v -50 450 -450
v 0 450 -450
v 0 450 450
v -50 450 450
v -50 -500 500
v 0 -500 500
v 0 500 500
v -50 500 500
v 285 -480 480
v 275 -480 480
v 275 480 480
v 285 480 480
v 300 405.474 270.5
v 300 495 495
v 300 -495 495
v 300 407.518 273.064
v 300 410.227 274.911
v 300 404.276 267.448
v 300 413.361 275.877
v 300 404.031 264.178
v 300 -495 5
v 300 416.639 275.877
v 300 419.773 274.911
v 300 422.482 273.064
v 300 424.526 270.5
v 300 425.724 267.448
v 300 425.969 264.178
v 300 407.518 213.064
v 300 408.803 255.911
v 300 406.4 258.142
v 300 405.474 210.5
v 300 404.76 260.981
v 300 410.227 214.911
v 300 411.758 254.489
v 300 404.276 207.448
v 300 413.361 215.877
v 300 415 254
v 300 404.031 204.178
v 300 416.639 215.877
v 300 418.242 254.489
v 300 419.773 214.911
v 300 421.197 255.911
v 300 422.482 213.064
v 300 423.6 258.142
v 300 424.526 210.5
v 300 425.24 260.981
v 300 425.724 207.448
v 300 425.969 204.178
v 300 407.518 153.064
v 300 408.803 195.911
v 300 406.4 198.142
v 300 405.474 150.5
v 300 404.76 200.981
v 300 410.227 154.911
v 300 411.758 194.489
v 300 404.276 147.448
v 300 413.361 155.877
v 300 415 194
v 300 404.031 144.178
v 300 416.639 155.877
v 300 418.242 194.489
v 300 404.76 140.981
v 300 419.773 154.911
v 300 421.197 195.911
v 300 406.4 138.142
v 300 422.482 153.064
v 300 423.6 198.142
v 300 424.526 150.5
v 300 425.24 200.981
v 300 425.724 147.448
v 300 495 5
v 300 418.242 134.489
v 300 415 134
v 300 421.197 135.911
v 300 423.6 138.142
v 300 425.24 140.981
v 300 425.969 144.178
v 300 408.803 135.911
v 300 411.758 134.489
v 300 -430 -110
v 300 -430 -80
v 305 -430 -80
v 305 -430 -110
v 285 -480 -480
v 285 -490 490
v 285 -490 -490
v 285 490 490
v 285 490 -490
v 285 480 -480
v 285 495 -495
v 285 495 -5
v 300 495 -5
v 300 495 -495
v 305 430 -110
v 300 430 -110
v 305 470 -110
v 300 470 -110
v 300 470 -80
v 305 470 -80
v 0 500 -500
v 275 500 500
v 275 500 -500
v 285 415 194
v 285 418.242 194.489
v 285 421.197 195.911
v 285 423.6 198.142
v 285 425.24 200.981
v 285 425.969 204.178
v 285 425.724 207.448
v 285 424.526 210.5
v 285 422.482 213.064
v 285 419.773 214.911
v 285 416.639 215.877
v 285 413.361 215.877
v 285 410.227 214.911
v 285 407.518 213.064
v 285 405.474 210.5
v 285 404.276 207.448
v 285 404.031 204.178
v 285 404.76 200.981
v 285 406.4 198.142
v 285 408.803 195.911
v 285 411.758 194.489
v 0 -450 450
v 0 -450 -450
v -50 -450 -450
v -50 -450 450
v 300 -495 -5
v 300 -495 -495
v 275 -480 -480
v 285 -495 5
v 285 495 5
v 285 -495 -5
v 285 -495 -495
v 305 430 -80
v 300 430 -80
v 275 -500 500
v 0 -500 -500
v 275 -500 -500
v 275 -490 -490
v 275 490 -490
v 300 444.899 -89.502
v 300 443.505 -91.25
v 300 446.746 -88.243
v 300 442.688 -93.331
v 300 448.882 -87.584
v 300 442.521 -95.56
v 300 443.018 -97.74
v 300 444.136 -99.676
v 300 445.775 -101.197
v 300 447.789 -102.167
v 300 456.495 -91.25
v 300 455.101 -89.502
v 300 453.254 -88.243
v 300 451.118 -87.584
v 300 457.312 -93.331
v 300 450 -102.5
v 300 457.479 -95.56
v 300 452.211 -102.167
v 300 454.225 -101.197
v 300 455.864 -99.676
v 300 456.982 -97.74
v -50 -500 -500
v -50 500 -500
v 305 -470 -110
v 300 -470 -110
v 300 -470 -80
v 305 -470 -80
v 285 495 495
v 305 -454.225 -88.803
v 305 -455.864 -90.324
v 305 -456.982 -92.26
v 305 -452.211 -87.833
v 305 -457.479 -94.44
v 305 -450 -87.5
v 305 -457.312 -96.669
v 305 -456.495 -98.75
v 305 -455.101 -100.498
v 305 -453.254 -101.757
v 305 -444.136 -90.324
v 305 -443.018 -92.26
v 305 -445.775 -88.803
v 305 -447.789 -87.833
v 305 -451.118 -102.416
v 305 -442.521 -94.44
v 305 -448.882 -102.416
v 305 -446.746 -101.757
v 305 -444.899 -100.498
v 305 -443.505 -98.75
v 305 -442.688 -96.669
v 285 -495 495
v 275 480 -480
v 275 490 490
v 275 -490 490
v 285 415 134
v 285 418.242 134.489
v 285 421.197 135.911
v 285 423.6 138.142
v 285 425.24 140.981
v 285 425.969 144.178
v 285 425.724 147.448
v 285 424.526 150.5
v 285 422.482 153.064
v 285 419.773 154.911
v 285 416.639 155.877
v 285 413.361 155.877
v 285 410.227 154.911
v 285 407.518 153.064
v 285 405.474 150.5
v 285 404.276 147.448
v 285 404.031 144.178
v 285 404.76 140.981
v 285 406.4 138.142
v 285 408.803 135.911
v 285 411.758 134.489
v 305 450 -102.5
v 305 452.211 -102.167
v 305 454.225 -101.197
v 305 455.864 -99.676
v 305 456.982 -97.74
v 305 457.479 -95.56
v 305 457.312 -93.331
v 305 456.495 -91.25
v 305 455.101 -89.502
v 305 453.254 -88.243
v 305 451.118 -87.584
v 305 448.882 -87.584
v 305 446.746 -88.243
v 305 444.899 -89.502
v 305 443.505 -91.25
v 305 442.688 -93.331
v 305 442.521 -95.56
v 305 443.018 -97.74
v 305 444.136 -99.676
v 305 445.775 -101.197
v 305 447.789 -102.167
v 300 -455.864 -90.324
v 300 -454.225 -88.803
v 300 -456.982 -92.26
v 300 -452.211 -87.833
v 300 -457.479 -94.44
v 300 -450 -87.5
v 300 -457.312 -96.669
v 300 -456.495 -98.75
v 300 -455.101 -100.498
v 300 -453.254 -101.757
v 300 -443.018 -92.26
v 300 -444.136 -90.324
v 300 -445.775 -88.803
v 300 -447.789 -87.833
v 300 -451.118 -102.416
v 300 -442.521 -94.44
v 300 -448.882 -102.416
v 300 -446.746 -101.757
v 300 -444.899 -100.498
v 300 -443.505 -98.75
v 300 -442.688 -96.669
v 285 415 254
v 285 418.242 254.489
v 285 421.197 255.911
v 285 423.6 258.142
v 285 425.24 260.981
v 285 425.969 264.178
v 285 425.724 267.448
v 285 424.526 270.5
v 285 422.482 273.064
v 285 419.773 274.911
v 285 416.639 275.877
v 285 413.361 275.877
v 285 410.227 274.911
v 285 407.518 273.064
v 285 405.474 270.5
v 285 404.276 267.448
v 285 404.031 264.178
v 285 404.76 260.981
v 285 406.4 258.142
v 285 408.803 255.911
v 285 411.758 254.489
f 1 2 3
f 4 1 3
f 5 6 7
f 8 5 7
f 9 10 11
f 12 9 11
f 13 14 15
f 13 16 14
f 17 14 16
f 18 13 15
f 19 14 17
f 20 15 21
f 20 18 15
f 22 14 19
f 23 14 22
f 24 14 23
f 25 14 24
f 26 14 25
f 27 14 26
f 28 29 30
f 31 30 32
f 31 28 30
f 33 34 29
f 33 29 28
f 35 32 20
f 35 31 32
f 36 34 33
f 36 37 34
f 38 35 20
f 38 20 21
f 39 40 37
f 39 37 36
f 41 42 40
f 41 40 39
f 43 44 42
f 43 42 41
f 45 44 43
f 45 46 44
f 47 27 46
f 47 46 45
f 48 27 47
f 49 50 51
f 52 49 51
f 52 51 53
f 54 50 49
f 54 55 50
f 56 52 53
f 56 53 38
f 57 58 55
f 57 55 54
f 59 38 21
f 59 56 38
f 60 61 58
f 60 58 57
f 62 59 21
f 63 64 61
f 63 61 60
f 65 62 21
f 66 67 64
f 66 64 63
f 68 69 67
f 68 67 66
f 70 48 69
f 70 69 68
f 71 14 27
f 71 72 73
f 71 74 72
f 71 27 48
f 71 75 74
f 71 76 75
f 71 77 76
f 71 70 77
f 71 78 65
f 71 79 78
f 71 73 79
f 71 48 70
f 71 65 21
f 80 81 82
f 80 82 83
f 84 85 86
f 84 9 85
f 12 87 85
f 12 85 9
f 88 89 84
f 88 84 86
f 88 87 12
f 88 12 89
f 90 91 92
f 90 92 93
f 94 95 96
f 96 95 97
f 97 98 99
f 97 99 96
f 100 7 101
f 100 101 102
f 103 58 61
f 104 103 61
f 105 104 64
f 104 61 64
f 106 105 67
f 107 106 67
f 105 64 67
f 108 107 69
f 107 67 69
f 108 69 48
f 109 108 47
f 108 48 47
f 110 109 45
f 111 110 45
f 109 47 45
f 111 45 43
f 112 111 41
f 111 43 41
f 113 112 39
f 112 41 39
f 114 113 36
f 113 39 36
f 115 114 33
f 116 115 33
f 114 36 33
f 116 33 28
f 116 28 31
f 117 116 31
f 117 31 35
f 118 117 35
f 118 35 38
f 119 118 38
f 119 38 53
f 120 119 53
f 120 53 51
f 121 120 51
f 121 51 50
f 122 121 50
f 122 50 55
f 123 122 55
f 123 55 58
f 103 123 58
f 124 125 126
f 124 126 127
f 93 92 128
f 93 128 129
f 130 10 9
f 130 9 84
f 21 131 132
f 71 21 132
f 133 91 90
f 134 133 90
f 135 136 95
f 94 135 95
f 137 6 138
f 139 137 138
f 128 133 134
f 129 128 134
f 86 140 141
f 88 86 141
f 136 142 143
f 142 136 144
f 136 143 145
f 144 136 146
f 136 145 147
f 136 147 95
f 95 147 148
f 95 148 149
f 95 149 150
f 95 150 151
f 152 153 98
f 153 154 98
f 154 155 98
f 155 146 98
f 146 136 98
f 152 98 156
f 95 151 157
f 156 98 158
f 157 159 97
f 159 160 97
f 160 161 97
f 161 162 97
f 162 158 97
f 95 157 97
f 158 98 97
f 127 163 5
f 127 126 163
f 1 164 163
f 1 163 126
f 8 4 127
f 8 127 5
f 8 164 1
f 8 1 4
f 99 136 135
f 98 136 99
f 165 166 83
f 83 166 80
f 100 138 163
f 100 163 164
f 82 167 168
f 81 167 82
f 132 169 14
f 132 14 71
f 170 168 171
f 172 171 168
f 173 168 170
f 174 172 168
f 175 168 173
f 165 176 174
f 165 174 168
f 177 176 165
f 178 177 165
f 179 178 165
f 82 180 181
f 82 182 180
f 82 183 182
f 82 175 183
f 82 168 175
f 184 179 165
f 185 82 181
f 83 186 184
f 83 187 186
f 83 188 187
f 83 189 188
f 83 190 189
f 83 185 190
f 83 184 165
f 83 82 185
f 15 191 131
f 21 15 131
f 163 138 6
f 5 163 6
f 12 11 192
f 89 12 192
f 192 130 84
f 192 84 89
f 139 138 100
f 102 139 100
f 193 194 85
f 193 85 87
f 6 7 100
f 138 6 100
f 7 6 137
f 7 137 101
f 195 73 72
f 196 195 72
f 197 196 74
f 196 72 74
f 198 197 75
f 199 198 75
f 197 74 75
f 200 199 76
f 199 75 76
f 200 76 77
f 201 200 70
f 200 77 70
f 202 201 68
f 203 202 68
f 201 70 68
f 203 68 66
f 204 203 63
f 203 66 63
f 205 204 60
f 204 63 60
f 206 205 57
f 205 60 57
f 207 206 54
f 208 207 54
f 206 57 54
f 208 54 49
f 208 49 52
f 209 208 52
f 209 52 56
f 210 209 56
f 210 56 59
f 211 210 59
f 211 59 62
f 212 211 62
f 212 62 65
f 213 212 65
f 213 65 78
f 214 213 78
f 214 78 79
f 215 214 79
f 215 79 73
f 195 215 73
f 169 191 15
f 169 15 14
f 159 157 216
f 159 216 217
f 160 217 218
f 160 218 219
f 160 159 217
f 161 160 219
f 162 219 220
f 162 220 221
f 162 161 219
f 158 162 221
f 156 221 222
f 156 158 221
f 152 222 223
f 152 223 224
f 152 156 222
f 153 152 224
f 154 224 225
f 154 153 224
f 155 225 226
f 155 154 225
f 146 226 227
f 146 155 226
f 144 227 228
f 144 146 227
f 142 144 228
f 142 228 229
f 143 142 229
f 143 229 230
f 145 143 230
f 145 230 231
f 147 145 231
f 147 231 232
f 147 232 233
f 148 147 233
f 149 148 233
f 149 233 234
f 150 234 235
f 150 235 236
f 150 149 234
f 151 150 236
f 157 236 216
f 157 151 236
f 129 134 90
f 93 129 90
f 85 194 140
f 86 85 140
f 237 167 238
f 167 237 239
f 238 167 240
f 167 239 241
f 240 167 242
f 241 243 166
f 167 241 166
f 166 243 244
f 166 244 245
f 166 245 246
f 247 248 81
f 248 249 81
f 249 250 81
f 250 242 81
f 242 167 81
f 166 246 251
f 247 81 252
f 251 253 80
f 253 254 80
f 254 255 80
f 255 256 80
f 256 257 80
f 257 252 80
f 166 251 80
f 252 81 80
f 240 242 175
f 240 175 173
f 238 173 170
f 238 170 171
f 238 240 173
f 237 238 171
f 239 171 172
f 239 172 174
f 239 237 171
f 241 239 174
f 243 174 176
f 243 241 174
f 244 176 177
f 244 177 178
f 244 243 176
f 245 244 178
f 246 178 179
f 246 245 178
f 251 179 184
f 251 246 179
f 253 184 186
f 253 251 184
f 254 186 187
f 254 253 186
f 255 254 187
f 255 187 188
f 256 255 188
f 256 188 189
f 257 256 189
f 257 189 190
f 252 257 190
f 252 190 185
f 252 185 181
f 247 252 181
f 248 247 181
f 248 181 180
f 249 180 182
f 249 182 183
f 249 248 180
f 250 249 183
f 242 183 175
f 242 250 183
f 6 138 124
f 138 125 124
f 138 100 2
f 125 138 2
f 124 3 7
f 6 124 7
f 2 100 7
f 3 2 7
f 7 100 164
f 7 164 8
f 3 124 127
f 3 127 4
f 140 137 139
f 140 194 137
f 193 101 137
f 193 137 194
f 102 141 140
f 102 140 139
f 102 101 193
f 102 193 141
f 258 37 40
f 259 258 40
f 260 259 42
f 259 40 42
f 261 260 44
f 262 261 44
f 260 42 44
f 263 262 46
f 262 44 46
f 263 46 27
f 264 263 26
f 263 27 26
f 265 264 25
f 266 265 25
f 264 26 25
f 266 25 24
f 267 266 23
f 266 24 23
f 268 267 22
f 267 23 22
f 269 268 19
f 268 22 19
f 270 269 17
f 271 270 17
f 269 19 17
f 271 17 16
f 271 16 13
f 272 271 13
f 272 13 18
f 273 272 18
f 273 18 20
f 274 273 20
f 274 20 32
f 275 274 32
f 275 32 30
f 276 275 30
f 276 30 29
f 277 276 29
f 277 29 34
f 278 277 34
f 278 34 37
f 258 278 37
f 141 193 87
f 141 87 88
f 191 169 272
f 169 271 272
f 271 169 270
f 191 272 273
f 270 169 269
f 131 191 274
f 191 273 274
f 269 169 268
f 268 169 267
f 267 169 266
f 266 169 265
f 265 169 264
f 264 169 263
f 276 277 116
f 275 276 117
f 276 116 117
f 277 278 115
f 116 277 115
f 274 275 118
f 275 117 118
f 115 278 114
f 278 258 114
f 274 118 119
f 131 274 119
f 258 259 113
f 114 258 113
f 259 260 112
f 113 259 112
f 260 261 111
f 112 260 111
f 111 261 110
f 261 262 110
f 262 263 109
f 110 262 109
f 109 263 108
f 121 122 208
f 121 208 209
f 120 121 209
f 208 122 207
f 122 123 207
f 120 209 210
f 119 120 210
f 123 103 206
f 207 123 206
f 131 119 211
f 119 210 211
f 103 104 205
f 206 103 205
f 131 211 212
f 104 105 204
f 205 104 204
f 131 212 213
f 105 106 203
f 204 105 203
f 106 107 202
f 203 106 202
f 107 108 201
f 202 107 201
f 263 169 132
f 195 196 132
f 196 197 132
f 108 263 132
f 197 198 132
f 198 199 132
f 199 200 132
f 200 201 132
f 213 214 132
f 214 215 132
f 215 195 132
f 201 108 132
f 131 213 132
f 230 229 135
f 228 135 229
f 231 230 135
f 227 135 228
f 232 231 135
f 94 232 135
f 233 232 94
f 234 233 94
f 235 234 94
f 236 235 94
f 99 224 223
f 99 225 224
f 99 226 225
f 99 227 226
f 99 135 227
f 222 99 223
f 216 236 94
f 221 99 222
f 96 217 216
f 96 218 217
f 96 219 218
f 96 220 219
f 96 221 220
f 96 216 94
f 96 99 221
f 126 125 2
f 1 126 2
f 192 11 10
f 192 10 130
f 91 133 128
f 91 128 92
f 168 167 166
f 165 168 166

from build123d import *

# Parameters (mm, degrees)
SKETCH1_W             = 1000
SKETCH1_H             = 1000
BOSS_EXTRUDE1_DEPTH   = 275
BOSS_EXTRUDE2_START   = 10
SKETCH2_W             = 490
SKETCH2_H             = 990
BOSS_EXTRUDE2_DEPTH   = 15
BOSS_EXTRUDE2_2_DEPTH = 15
SKETCH3_W             = 980
SKETCH3_H             = 980
SKETCH3_W_2           = 960
SKETCH3_H_2           = 960
BOSS_EXTRUDE3_DEPTH   = 10
SKETCH4_W             = 1000
SKETCH4_H             = 1000
SKETCH4_W_2           = 900
SKETCH4_H_2           = 900
BOSS_EXTRUDE4_DEPTH   = 50
SKETCH5_R             = 11
CUT_EXTRUDE1_DEPTH    = 25
SKETCH6_W             = 30
SKETCH6_H             = 40
SKETCH6_R             = 7.5
BOSS_EXTRUDE5_DEPTH   = 5
BOSS_EXTRUDE5_2_DEPTH = 5


with BuildPart() as part:
    # Sketch1 → Boss-Extrude1 (new body)
    with BuildSketch(Plane(origin=(0, 0, 0), x_dir=(0, 0, -1), z_dir=(1, 0, 0))):
        Rectangle(SKETCH1_W, SKETCH1_H)
    extrude(amount=BOSS_EXTRUDE1_DEPTH)

    # Sketch3 → Boss-Extrude3 (add)
    with BuildSketch(Plane(origin=(275, 0, 0), x_dir=(0, 0, -1), z_dir=(1, 0, 0))):
        Rectangle(SKETCH3_W, SKETCH3_H)
        Rectangle(SKETCH3_W_2, SKETCH3_H_2, mode=Mode.SUBTRACT)
    extrude(amount=BOSS_EXTRUDE3_DEPTH)


with BuildPart() as body_2:
    # Sketch2 → Boss-Extrude2 (new body)
    with BuildSketch(Plane(origin=(275, 0, 0), x_dir=(0, 0, -1), z_dir=(1, 0, 0)).offset(BOSS_EXTRUDE2_START)):
        with Locations((-250, 0)):
            Rectangle(SKETCH2_W, SKETCH2_H)
    extrude(amount=BOSS_EXTRUDE2_DEPTH)

    # Sketch5 → Cut-Extrude1 (cut)
    with BuildSketch(Plane(origin=(300, 0, 0), x_dir=(0, 0, -1), z_dir=(1, 0, 0))):
        with Locations((-265, 415)):
            Circle(SKETCH5_R)
        with Locations((-205, 415)):
            Circle(SKETCH5_R)
        with Locations((-145, 415)):
            Circle(SKETCH5_R)
    extrude(amount=-CUT_EXTRUDE1_DEPTH, mode=Mode.SUBTRACT)


with BuildPart() as body_3:
    # Sketch2 → Boss-Extrude2 2 (new body)
    with BuildSketch(Plane(origin=(275, 0, 0), x_dir=(0, 0, -1), z_dir=(1, 0, 0)).offset(BOSS_EXTRUDE2_START)):
        with Locations((250, 0)):
            Rectangle(SKETCH2_W, SKETCH2_H)
    extrude(amount=BOSS_EXTRUDE2_2_DEPTH)


with BuildPart() as body_4:
    # Sketch4 → Boss-Extrude4 (new body)
    with BuildSketch(Plane.ZY):
        Rectangle(SKETCH4_W, SKETCH4_H)
        Rectangle(SKETCH4_W_2, SKETCH4_H_2, mode=Mode.SUBTRACT)
    extrude(amount=BOSS_EXTRUDE4_DEPTH)


with BuildPart() as body_5:
    # Sketch6 → Boss-Extrude5 (new body)
    with BuildSketch(Plane(origin=(300, 0, 0), x_dir=(0, 0, -1), z_dir=(1, 0, 0))):
        with Locations((95, 450)):
            Rectangle(SKETCH6_W, SKETCH6_H)
        with Locations((95, 450)):
            Circle(SKETCH6_R, mode=Mode.SUBTRACT)
    extrude(amount=BOSS_EXTRUDE5_DEPTH)


with BuildPart() as body_6:
    # Sketch6 → Boss-Extrude5 2 (new body)
    with BuildSketch(Plane(origin=(300, 0, 0), x_dir=(0, 0, -1), z_dir=(1, 0, 0))):
        with Locations((95, -450)):
            Rectangle(SKETCH6_W, SKETCH6_H)
        with Locations(Location((95, -450, 0), (0, 0, 180))):
            Circle(SKETCH6_R, mode=Mode.SUBTRACT)
    extrude(amount=BOSS_EXTRUDE5_2_DEPTH)


solid = Compound([part.part, body_2.part, body_3.part, body_4.part, body_5.part, body_6.part])
